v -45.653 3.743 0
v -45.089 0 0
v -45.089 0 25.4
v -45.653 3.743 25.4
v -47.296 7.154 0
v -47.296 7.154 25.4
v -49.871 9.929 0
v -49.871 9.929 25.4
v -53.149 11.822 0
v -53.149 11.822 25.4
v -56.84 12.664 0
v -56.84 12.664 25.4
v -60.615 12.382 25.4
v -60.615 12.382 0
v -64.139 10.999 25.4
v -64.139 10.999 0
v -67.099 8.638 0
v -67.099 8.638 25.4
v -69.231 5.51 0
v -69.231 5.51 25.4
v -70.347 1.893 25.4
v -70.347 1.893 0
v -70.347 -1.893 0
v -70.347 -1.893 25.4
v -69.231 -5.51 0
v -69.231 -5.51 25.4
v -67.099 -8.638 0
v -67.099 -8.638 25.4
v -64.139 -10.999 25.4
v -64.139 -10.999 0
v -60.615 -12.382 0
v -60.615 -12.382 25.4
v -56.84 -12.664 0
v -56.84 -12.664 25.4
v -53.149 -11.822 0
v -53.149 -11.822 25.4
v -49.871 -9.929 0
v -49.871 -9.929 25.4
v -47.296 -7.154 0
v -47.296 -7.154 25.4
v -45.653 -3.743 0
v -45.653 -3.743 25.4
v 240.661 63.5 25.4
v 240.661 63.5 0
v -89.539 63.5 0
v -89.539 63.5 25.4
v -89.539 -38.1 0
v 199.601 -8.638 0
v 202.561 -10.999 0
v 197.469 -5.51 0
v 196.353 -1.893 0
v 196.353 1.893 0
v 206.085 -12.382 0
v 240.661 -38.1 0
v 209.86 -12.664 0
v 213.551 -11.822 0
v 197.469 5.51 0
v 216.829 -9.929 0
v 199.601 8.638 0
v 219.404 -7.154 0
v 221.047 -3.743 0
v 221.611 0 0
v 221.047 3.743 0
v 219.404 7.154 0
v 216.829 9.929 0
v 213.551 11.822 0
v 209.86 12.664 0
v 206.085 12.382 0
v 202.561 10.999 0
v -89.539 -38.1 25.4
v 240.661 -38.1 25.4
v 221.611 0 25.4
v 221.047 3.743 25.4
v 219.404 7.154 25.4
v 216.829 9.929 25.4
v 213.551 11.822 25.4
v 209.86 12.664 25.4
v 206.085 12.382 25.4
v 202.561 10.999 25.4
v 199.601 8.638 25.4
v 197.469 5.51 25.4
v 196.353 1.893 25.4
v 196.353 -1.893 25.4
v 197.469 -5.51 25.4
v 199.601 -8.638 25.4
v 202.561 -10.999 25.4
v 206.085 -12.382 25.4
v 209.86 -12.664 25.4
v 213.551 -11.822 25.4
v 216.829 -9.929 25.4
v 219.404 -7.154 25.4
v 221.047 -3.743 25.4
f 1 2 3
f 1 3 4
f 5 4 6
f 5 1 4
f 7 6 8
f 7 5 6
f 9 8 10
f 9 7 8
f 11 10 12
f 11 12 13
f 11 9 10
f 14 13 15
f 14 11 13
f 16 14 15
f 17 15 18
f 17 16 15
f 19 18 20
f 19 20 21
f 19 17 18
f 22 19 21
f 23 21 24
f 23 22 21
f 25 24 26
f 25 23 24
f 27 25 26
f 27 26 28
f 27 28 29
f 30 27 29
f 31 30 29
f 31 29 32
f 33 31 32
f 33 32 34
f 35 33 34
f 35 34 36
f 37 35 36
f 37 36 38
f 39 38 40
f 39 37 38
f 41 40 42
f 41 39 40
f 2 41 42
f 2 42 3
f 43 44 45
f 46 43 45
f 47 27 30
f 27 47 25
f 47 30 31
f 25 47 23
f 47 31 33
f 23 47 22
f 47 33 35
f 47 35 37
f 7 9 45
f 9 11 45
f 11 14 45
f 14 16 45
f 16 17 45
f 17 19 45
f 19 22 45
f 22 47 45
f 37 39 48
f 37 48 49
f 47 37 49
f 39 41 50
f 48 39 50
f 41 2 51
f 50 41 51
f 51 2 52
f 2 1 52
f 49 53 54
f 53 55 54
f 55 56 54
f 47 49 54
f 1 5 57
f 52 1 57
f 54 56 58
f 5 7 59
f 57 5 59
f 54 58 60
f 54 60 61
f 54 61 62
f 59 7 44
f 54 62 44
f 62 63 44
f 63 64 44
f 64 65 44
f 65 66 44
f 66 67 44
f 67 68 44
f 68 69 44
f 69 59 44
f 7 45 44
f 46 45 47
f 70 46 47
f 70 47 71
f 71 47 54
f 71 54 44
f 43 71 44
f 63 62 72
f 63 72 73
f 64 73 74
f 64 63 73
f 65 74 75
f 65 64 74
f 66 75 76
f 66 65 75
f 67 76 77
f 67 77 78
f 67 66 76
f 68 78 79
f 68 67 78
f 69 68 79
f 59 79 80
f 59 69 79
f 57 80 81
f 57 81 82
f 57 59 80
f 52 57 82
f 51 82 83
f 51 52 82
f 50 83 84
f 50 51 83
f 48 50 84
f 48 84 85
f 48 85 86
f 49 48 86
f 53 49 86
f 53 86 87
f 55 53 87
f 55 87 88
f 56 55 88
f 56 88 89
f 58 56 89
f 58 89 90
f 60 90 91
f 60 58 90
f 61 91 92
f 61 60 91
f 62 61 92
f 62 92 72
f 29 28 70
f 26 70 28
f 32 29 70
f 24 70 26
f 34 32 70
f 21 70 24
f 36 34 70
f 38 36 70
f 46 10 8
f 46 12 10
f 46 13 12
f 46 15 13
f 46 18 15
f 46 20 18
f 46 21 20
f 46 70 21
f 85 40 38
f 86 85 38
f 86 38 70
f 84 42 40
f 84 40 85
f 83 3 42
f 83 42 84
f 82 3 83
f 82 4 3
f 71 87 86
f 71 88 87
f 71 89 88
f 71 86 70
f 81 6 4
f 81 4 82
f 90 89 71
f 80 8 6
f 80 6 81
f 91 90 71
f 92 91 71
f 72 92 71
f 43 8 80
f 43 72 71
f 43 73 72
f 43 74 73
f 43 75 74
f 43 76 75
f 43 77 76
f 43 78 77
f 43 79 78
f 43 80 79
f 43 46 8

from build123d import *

# Parameters (mm, degrees)
F0_W     = 165.1
F0_H     = 19.05
F0_R     = 12.7
F1_DEPTH = 25.4


with BuildPart() as f1:
    # F0 (on Top) → F1 (new body)
    with BuildSketch(Plane.XY):
        with Locations((158.11099, 53.975)):
            Rectangle(F0_W, F0_H)
        Polygon((75.56099, 44.45), (-89.53901, 44.45), (-89.53901, 0), (-89.53901, -38.1), (-57.78901, -38.1), (75.56099, -38.1), align=None)
        with Locations((-57.78901, 0)):
            Circle(F0_R, mode=Mode.SUBTRACT)
        Polygon((240.66099, 44.45), (75.56099, 44.45), (75.56099, -38.1), (208.91099, -38.1), (240.66099, -38.1), (240.66099, 0), align=None)
        with Locations((208.91099, 0)):
            Circle(F0_R, mode=Mode.SUBTRACT)
        with Locations((-6.98901, 53.975)):
            Rectangle(F0_W, F0_H)
    extrude(amount=F1_DEPTH)


solid = f1.part
